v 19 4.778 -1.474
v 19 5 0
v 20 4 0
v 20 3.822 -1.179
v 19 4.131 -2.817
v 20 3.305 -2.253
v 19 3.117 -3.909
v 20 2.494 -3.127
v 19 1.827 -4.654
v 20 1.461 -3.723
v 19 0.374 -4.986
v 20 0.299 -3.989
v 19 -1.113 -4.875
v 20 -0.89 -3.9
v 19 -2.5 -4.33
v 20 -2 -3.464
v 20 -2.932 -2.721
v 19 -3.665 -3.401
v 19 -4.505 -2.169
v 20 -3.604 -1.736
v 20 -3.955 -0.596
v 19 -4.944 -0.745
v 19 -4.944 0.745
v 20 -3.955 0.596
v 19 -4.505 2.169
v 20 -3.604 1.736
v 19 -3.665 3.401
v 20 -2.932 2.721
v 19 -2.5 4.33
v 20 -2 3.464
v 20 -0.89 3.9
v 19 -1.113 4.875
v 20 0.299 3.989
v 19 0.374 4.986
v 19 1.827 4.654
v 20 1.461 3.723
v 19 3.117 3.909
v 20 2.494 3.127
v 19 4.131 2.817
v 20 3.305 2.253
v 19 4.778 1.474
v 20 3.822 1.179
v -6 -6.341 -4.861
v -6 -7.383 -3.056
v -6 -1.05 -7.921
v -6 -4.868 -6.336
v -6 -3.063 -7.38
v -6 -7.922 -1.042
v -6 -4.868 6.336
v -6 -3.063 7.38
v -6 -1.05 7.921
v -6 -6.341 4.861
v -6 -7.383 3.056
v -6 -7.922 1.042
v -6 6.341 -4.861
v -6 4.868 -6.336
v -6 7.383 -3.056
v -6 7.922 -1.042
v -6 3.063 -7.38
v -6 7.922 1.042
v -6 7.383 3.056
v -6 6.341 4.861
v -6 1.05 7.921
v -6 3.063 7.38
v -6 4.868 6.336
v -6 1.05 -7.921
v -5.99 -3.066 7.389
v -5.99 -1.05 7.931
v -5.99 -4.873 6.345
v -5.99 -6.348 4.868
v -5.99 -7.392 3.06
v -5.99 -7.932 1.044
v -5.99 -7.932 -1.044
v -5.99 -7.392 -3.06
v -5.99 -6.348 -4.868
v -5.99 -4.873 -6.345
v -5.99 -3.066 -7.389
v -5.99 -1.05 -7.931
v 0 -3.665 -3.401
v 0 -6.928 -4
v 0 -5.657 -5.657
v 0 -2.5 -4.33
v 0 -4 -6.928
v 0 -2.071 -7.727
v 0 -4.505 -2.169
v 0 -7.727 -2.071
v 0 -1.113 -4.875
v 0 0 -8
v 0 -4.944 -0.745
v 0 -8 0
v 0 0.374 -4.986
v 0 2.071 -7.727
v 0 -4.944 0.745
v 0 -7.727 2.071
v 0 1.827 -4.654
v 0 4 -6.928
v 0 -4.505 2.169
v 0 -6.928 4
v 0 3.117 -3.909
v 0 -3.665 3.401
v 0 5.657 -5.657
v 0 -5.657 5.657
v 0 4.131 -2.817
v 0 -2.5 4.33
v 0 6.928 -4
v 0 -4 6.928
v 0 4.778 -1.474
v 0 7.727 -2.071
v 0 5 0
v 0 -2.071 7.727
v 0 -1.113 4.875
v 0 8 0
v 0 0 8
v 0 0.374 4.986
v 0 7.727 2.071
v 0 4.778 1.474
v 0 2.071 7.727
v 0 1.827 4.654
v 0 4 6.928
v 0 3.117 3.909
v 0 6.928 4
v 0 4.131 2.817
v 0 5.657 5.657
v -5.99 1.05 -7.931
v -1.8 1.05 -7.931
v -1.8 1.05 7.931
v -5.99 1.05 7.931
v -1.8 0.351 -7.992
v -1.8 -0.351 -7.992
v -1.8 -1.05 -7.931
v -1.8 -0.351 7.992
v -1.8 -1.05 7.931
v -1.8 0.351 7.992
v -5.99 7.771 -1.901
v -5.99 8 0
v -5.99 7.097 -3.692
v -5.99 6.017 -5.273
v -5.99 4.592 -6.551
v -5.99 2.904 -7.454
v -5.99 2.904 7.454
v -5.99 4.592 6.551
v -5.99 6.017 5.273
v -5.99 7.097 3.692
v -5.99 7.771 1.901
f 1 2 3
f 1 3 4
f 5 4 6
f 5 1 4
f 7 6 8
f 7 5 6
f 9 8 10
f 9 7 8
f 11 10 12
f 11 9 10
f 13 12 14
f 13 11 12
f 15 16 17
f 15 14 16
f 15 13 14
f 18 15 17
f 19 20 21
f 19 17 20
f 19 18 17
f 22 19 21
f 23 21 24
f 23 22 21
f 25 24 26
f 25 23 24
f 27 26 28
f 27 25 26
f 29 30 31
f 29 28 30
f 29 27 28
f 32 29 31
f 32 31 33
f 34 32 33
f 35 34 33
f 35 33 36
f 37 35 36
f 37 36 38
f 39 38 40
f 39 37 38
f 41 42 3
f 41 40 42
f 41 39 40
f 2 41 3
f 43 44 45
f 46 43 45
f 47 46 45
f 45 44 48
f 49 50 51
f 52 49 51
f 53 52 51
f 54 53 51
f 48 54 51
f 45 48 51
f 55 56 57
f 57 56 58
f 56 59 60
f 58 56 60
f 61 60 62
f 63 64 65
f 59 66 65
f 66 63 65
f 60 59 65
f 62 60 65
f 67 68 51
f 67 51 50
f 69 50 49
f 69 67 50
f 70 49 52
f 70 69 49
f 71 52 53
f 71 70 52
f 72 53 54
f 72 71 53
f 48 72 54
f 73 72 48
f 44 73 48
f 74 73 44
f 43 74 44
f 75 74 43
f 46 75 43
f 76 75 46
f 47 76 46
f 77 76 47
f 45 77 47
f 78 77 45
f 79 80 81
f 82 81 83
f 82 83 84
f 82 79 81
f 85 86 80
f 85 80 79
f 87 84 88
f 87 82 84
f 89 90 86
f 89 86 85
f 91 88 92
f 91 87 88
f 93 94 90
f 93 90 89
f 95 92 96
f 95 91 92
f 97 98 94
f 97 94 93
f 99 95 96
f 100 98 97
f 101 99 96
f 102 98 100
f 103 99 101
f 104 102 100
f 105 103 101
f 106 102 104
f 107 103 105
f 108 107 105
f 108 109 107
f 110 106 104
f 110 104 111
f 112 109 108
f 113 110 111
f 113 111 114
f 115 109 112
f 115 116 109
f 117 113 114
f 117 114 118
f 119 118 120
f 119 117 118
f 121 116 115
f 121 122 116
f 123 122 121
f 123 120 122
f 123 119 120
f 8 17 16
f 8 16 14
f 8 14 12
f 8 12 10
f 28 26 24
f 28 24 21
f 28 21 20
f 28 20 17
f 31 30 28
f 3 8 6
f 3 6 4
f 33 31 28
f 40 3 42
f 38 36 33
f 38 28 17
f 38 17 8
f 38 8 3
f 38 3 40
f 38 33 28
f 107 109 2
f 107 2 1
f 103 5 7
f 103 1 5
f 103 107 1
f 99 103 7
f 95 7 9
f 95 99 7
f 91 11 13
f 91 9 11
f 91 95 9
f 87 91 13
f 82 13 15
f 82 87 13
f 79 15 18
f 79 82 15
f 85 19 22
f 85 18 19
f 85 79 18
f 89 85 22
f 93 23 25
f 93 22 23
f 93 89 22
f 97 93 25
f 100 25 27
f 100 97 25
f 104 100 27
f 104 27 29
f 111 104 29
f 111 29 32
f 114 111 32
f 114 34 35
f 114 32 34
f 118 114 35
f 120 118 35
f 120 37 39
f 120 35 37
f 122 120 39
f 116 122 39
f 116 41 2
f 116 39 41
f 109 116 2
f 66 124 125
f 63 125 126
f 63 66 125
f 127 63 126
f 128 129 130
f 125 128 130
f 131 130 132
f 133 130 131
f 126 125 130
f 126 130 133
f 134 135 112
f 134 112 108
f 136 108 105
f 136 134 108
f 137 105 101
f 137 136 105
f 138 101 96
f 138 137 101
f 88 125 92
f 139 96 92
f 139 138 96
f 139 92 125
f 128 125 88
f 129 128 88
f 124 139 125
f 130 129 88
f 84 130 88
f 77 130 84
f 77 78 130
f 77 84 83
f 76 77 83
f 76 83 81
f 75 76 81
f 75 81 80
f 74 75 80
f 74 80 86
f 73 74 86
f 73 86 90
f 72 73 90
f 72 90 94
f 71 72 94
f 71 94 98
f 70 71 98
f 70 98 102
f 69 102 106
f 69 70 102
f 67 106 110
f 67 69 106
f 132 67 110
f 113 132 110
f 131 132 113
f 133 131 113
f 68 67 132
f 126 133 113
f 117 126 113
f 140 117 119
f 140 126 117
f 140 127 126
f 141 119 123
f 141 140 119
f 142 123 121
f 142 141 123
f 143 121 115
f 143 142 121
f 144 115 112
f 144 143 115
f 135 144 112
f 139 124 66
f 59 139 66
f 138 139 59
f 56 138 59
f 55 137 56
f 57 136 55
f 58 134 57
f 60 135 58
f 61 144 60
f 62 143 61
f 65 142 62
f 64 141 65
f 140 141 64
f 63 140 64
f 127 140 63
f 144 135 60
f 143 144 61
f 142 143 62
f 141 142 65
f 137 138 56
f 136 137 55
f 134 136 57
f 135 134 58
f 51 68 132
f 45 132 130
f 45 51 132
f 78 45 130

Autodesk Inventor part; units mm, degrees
ref_plane "YZ Plane" through (0, 0, 0) normal (1, 0, 0) x (0, 1, 0)
ref_plane "XZ Plane" through (0, 0, 0) normal (0, 1, 0) x (-1, 0, 0)
sketch "Эскиз1" plane through (0, 0, 0) normal (0, 0, 1) x (1, 0, 0)
  line L0 (-6, 0) -> (20, 0)
  line L1 (20, 0) -> (20, 5)
  line L2 (20, 5) -> (1.5, 5)
  line L3 (1.5, 5) -> (0.5798, 5)
  line L4 (0.5798, 5) -> (0, 5)
  line L5 (0, 5) -> (0, 8)
  line L6 (-11.2, 0) -> (25.2, 0) projected
  line L7 (0, -1.6) -> (0, 9.6) projected
  line L8 (-6, 0) -> (-6, 8)
  line L9 (0, 8) -> (-6, 8)
  dimension "d0" = 20
  dimension "d1" = 18.5
  dimension "d2" = 0.9202
  dimension "d3" = 6
  dimension "d4" = 10
  dimension "d5" = 10
  dimension "d9" = 16
  dimension "d10" = 0
revolve "Базовый элемент" add sketch "Эскиз1" angle 360 about axis through (-6, 0, 0) along (1, 0, 0)
sketch "Эскиз2" plane through (-6, 0, 0) normal (-1, 0, 0) x (0, 0, 1)
  circle A0 centre (0, 0) radius 8 projected
  line L0 (0, 0) -> (0, 8) projected
  line L1 (-8, 1.05) -> (8, 1.05)
  line L2 (8, 1.05) -> (8, -1.05)
  line L3 (8, -1.05) -> (-8, -1.05)
  line L4 (-8, -1.05) -> (-8, 1.05)
  line L5 (-8, 0) -> (8, 0) construction
  line L6 (0, 1.05) -> (0, -1.05) construction
  dimension "d11" = 2.1
  dimension "d12" = 16
fillet "Сопряжение1" radius 0.01 1 edges at (-6, -8, 0)
extrude "Паз" cut sketch "Эскиз2" against normal blind 4.2 contours A0 L3 L1 | L2 L3 A0 | A0 L1 L2 | L3 L4 A0 | A0 L4 L1
thread "Резьба" size "M10x1.5" class "6g" standard "ISO Metric profile" length 18.5
chamfer "Chamfer4" distance 1 angle 45 1 edges at (20, -5, 0)
ref_plane "Work Plane1" through (30.1625, 0, 0) normal (0, 0, -1) x (1, 0, 0)
equation "\"d11\" = SBR"
equation "\"d12\" = KOD"
equation "\"d13\" = RR"
equation "\"d16\" = STI"
equation "\"d14\" = GEL"
equation "\"d40\" = 0.1 * GD"
equation "\"d0\" = NLG"
equation "\"d1\" = GEL"
equation "\"d2\" = GAL"
equation "\"d3\" = KOH"
equation "\"d4\" = GD"
equation "\"d5\" = BDM"
equation "\"d9\" = KOD"
equation "\"GD\" = NND"
equation "\"NLG\" = 20"
equation "\"GEL\" = 18.5"
equation "\"KOD\" = 16"
equation "\"KOH\" = 6"
equation "\"GAL\" = 0.61345 * PTC"
equation "\"BDM\" = NND"
equation "\"RR\" = 0.01"
equation "\"SBR\" = 2.1"
equation "\"STI\" = 4.2"
equation "\"KEWI\" = 0"
equation "\"GUL\" = 0.61345 * PTC"
equation "\"SPD\" = NND - 1.2269 * PTC"
equation "\"PTC\" = 1.5"
equation "\"TOA\" = 30deg"
equation "\"FAWI\" = 45deg"
equation "\"GD1\" = THREADDIA - 1.2269 * PTC"
equation "\"NND\" = 10"
equation "\"THREADDIA\" = 10"
properties part number "Винт M10-6gx20 ГОСТ 1491-80" material "Сталь, мягкая"
